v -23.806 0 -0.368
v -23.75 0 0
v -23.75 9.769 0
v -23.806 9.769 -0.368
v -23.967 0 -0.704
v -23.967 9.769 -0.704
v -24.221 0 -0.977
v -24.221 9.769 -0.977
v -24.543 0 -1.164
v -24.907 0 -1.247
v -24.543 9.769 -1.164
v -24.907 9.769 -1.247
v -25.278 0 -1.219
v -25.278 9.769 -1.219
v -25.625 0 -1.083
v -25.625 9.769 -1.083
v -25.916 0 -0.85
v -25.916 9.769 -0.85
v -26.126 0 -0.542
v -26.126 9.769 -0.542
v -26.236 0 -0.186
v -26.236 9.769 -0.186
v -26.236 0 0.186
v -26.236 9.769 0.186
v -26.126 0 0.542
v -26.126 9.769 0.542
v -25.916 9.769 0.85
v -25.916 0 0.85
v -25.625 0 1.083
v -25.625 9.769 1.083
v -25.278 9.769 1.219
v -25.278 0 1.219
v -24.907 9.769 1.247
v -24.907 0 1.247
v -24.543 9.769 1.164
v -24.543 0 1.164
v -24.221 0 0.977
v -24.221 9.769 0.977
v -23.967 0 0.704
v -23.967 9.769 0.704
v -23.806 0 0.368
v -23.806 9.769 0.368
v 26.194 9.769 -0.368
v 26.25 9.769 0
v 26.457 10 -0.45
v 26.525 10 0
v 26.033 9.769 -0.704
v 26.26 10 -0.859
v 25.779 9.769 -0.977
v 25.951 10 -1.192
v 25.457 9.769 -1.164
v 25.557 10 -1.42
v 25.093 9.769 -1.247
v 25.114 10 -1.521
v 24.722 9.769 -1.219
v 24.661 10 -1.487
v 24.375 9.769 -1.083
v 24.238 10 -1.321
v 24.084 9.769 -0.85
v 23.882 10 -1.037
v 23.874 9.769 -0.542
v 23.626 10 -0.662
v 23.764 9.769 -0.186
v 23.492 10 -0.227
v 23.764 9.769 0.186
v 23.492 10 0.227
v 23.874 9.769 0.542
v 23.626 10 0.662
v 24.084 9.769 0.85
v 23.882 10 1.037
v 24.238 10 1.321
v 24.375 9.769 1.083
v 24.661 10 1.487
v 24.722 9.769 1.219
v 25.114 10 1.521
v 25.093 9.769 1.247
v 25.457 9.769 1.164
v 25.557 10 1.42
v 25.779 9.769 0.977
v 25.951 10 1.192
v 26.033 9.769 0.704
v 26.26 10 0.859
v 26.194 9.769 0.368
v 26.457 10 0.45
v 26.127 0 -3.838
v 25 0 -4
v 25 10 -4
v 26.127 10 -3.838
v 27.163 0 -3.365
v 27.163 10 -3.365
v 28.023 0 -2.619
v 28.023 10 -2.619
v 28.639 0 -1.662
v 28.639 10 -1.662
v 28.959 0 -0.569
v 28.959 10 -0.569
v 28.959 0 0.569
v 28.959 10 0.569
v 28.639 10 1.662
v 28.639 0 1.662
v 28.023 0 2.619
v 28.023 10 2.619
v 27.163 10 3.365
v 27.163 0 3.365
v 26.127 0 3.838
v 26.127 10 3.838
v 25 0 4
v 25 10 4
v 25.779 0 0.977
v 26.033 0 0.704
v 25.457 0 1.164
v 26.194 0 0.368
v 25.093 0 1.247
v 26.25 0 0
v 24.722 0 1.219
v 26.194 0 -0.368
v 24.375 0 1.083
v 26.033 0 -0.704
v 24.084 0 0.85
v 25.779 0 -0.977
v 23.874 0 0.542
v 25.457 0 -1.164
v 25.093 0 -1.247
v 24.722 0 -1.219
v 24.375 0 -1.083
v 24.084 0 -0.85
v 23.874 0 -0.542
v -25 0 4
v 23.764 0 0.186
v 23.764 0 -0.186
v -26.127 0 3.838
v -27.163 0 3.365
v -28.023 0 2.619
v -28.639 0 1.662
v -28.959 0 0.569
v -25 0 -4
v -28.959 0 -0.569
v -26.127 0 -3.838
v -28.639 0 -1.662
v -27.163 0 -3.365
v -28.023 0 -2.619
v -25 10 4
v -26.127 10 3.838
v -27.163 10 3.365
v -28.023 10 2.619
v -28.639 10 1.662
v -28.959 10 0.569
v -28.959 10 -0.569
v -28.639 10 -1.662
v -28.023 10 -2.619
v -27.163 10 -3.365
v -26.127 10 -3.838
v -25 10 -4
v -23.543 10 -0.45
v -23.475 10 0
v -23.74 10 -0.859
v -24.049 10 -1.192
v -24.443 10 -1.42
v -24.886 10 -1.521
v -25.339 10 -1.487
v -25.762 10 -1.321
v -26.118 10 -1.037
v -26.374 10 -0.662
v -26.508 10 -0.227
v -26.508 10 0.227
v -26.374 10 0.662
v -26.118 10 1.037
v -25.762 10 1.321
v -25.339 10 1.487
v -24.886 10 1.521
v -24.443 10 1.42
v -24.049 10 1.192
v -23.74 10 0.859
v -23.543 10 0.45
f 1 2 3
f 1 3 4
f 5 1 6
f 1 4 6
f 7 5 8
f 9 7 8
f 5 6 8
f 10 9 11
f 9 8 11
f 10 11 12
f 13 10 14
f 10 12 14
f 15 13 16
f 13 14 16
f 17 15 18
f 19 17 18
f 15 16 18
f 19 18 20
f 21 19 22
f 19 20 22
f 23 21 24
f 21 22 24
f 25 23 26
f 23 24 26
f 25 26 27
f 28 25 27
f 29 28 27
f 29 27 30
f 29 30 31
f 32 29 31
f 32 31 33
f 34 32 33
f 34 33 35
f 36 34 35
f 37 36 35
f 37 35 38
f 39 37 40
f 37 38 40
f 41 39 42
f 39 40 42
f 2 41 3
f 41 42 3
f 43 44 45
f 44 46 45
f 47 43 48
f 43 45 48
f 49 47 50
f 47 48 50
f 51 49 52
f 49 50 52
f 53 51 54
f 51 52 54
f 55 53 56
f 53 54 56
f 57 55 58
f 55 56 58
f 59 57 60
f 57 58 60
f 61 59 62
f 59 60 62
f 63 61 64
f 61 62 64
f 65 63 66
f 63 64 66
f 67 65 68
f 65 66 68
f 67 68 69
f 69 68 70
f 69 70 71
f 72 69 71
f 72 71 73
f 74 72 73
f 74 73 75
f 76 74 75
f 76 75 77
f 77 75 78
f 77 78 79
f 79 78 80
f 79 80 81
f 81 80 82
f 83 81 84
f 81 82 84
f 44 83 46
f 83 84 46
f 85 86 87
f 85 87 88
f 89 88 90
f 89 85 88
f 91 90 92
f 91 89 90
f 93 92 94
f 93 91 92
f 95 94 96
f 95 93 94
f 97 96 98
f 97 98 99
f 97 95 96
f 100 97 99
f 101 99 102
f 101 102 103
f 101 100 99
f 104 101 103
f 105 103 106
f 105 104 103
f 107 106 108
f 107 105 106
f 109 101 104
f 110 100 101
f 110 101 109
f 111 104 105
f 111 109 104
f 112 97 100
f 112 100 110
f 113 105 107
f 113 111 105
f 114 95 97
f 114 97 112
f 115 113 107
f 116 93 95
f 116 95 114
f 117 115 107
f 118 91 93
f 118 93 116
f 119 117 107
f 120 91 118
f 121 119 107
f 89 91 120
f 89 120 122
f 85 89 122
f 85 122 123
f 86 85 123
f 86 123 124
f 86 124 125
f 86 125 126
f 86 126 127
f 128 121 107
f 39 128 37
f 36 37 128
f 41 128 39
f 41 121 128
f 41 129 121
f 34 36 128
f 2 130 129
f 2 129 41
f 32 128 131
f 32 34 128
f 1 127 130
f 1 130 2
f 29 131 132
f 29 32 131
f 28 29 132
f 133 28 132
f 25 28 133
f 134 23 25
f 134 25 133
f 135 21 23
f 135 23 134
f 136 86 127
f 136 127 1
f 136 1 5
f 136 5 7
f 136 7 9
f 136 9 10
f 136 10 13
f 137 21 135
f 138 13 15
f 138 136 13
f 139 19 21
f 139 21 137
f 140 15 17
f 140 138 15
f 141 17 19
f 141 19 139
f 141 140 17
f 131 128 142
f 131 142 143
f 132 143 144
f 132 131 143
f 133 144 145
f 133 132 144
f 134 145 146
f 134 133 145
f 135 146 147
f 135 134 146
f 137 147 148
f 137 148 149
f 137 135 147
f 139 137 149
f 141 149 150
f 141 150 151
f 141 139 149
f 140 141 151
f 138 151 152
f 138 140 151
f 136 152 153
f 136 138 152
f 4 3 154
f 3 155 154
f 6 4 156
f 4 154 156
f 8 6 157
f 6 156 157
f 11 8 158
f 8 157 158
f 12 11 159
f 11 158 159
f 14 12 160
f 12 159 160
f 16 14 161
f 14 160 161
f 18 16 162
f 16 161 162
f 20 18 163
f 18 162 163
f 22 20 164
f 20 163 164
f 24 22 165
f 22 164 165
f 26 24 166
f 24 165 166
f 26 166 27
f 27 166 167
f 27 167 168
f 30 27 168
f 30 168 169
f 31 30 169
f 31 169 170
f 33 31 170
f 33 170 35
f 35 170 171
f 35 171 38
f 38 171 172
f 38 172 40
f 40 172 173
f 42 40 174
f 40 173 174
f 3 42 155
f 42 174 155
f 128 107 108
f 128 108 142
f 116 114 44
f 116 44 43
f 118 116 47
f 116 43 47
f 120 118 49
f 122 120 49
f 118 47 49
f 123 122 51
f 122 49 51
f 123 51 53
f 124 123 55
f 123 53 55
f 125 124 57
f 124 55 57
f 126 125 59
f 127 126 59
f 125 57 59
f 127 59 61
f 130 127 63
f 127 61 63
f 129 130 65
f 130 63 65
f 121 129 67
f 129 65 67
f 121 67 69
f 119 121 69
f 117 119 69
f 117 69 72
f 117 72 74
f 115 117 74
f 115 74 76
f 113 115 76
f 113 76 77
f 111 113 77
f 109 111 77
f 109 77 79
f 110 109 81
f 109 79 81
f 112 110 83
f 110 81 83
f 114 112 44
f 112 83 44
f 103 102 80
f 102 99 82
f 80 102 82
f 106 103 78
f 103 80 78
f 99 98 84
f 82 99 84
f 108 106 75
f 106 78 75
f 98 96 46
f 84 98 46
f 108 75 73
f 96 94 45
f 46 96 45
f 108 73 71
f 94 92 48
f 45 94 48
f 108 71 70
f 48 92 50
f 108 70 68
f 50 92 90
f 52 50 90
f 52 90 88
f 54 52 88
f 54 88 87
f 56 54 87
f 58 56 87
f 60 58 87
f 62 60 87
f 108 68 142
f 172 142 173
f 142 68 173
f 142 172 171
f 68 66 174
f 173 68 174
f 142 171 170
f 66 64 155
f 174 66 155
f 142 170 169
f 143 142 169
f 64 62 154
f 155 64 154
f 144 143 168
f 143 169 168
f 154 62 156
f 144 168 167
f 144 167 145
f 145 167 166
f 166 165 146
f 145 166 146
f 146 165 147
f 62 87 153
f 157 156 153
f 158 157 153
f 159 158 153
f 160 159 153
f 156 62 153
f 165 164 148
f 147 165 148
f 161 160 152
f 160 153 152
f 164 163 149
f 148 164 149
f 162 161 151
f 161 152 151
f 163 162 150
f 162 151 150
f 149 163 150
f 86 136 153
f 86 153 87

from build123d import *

# Parameters (mm, degrees)
BOSS_EXTRUDE1_DEPTH = 10


# Read off the part's stored shape, not the designer's step: M3x0.5 Tapped Hole1
with BuildPart() as part:
    # Sketch1 → Boss-Extrude1 (new body)
    with BuildSketch(Plane(origin=(0, 0, 0), x_dir=(1, 0, 0), z_dir=(0, 1, 0))):
        with BuildLine():
            Line((-25, 4), (25, 4))
            ThreePointArc((25, 4), (29, 0), (25, -4))
            Line((25, -4), (-25, -4))
            ThreePointArc((-25, -4), (-29, 0), (-25, 4))
        make_face()
    extrude(amount=BOSS_EXTRUDE1_DEPTH)

    # M3x0.5 Tapped Hole1 outline → M3x0.5 Tapped Hole1 (revolve, cut)
    with BuildSketch(Plane(origin=(-25, 0, 0), x_dir=(1, 0, 0), z_dir=(0, 0, 1))):
        Polygon((0, 0), (1.25, 0), (1.25, 9.769247601), (1.525, 10), (0, 10), align=None)
    revolve(axis=Axis((-25, 0, 0), (0, 1, 0)), mode=Mode.SUBTRACT)

    # M3x0.5 Tapped Hole1 2 outline → M3x0.5 Tapped Hole1 2 (revolve, cut)
    with BuildSketch(Plane(origin=(25, 0, 0), x_dir=(1, 0, 0), z_dir=(0, 0, 1))):
        Polygon((0, 0), (1.25, 0), (1.25, 9.769247601), (1.525, 10), (0, 10), align=None)
    revolve(axis=Axis((25, 0, 0), (0, 1, 0)), mode=Mode.SUBTRACT)


solid = part.part
